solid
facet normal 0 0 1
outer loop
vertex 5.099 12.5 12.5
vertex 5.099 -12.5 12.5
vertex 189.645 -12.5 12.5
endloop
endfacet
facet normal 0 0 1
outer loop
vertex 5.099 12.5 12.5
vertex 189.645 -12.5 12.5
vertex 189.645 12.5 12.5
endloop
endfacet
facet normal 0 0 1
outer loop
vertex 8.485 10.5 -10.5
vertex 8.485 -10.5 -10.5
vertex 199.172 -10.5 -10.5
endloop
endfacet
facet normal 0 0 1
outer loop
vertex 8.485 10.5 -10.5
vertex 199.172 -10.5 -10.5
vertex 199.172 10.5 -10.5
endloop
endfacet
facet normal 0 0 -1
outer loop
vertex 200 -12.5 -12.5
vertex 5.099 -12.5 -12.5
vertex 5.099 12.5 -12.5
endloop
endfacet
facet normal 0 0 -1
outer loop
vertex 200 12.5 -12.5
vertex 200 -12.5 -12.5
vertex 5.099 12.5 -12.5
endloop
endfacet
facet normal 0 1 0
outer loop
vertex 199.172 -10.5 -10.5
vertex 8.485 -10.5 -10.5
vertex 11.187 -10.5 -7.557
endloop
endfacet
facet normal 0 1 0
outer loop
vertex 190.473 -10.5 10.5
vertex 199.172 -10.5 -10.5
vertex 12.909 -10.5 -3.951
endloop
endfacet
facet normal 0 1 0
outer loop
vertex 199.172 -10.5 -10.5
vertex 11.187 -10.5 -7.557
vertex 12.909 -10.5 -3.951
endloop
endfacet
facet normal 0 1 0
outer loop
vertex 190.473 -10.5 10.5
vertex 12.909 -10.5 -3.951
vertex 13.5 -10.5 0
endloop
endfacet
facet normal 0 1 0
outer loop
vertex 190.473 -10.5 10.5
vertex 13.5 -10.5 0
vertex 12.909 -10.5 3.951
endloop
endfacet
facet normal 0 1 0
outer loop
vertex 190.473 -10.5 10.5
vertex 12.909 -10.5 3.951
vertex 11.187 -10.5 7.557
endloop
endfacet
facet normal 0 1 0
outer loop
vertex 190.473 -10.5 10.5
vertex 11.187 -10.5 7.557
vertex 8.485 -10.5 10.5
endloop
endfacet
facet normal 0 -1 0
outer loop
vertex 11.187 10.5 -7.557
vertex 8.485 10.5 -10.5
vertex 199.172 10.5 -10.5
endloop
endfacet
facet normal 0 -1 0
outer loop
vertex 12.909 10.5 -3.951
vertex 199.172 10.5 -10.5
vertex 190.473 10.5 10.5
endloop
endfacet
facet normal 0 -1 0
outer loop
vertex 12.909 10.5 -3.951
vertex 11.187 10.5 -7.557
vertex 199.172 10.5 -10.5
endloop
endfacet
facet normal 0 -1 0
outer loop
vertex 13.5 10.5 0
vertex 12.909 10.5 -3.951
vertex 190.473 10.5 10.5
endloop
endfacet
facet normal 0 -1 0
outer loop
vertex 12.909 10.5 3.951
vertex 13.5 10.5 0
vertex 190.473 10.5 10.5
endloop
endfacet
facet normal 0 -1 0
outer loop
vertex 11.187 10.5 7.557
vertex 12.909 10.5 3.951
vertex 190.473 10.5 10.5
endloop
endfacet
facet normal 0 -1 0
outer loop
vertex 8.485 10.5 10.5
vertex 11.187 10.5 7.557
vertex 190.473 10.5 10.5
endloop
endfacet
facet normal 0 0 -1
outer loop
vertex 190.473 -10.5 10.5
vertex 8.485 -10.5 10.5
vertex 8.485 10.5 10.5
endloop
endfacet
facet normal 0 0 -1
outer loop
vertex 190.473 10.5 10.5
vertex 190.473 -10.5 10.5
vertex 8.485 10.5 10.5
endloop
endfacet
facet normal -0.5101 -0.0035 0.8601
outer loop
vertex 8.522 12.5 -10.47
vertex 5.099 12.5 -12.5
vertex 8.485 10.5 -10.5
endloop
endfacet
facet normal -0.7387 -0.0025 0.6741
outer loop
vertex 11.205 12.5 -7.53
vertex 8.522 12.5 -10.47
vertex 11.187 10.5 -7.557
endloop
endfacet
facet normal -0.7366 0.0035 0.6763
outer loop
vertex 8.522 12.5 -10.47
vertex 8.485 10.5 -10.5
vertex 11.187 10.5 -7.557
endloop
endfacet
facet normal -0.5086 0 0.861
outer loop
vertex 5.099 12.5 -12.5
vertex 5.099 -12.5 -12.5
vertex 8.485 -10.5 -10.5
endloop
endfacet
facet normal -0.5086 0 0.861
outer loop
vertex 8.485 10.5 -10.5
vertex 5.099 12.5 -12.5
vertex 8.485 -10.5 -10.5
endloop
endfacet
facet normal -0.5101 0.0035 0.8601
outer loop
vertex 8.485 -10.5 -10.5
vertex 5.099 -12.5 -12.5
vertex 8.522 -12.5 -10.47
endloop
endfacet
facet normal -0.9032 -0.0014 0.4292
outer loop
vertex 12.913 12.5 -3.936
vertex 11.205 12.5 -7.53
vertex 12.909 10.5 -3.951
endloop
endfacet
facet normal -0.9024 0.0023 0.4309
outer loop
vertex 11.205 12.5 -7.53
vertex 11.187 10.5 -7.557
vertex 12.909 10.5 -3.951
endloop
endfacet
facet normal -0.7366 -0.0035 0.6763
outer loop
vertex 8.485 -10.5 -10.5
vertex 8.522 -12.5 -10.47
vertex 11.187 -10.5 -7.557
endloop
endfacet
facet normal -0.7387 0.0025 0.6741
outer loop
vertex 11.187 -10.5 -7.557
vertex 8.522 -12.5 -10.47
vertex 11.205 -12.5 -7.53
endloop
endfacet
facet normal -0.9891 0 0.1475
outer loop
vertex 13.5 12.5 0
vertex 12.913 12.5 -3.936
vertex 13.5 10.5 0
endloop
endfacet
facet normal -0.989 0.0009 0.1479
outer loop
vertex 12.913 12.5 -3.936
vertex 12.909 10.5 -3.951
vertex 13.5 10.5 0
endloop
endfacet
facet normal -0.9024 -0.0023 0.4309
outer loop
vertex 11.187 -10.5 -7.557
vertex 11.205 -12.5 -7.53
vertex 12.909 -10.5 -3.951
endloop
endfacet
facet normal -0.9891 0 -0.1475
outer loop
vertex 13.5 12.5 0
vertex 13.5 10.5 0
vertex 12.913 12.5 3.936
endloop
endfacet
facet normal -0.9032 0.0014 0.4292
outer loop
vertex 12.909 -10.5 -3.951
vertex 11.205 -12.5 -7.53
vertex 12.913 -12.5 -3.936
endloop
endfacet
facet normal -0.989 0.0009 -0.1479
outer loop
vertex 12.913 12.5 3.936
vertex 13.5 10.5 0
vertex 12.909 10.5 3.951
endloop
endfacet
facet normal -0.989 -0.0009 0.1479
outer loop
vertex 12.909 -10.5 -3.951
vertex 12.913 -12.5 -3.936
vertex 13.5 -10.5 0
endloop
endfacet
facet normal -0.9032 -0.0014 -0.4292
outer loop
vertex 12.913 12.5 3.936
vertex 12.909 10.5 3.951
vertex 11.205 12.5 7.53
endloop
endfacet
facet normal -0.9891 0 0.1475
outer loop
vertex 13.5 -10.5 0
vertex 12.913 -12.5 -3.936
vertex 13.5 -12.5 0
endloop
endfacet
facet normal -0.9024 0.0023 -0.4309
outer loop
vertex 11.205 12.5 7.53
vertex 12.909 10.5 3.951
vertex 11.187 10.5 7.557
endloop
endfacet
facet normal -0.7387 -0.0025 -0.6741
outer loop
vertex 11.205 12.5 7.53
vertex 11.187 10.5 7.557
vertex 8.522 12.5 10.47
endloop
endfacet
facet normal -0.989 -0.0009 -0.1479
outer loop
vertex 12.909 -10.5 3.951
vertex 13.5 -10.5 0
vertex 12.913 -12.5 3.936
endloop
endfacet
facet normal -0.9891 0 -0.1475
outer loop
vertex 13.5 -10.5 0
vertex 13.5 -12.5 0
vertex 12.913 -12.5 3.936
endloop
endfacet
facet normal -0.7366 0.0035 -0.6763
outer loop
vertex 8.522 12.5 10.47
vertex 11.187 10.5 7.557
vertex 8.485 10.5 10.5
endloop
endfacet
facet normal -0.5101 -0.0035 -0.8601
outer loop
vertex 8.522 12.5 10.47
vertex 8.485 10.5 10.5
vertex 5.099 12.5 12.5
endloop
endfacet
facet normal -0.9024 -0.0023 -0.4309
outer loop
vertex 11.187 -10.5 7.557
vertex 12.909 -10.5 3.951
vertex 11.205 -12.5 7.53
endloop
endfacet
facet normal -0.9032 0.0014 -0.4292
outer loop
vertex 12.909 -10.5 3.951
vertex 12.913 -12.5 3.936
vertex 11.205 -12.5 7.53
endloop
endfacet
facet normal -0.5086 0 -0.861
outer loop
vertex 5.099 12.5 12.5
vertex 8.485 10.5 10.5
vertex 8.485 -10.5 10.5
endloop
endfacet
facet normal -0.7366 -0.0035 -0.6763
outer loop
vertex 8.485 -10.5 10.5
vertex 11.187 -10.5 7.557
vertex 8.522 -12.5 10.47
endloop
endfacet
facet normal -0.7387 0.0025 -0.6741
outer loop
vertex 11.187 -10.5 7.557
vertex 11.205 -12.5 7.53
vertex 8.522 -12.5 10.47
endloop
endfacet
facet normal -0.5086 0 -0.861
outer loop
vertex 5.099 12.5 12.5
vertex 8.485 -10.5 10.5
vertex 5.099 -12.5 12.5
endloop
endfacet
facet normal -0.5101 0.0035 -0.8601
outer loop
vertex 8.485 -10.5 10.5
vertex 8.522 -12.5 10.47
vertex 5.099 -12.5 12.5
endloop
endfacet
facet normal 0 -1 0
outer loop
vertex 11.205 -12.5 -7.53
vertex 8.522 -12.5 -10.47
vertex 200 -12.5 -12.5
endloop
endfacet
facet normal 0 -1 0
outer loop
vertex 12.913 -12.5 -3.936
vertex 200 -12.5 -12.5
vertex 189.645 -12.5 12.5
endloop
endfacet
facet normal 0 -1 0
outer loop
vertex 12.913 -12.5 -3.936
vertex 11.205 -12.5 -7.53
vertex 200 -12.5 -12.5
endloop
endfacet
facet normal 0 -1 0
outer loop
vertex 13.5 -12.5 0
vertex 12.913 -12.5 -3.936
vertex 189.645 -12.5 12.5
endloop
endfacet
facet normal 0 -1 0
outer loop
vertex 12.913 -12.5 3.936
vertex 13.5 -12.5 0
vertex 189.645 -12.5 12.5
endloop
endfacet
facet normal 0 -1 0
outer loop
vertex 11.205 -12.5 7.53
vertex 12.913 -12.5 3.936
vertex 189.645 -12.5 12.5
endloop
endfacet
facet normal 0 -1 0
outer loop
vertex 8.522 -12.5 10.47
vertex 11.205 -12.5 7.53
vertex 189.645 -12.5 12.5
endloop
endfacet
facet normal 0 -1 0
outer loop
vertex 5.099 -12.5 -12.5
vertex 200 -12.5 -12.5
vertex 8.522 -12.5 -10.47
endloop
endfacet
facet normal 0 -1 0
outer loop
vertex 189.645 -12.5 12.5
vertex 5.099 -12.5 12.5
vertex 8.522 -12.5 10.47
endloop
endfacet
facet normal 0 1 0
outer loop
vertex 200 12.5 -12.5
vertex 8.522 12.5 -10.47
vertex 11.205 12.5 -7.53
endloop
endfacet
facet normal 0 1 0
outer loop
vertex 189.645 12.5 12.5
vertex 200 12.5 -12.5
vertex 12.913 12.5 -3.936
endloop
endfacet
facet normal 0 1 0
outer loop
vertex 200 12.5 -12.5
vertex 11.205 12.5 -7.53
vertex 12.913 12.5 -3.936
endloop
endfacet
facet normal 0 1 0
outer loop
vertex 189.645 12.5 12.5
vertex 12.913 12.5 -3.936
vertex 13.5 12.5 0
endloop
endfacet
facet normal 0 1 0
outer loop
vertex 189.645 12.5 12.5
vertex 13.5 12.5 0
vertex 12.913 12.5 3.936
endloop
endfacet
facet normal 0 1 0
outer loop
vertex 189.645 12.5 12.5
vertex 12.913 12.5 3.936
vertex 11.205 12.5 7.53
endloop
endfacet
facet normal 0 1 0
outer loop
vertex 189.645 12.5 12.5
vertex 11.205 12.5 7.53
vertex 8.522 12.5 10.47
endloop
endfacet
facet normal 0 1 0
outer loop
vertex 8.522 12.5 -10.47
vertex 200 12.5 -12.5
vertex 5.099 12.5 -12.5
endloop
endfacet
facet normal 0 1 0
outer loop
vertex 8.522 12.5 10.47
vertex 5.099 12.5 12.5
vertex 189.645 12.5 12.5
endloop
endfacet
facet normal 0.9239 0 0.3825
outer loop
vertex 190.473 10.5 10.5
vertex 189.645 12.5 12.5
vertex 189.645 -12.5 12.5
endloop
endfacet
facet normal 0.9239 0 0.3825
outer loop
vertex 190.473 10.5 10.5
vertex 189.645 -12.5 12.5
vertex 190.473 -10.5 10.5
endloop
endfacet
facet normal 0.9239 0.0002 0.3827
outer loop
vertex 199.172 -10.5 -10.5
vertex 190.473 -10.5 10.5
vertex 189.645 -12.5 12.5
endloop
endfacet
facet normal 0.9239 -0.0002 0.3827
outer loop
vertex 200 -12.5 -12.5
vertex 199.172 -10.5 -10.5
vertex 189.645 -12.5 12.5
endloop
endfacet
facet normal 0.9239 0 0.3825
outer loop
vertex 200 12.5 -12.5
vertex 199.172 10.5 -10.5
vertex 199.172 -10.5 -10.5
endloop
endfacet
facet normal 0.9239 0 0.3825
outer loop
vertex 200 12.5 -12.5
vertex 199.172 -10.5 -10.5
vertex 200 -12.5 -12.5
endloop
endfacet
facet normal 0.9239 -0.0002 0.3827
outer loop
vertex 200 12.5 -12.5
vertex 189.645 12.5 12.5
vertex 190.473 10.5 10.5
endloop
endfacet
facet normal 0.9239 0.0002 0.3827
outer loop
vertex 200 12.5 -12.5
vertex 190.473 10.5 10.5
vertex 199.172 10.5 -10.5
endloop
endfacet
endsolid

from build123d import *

# Parameters (mm, degrees)
F0_W        = 25
F0_H        = 25
F0_W_2      = 21
F0_H_2      = 21
F1_DEPTH    = 200
F2_T1_DEPTH = 154.6335196453
F3_R        = 13.5
F4_DEPTH    = 25


# Not quite as in the source:
# - a fillet or chamfer that OpenCascade refuses, or shapes differently, is made with other operations: its cross-section is extruded or revolved along the edge and cut away or added


with BuildPart() as f1:
    # F0 (on Right) → F1 (new body)
    with BuildSketch(Plane.YZ):
        Rectangle(F0_W, F0_H)
        Rectangle(F0_W_2, F0_H_2, mode=Mode.SUBTRACT)
    extrude(amount=F1_DEPTH)

    # F2: chamfer of 25 x 10.3553390593 on 1 edges, made by hand

    # F2_s2 → F2_t1 (cut)
    with BuildSketch(Plane.XZ.offset(-77.3167598227)):
        Polygon((189.6446609407, 12.5), (200, -12.5), (200, 12.5), align=None)
    extrude(amount=F2_T1_DEPTH, mode=Mode.SUBTRACT)

    # F3 (on face) → F4 (cut)
    with BuildSketch(Plane.XZ.offset(12.5)):
        Circle(F3_R)
    extrude(amount=-F4_DEPTH, mode=Mode.SUBTRACT)


solid = f1.part
